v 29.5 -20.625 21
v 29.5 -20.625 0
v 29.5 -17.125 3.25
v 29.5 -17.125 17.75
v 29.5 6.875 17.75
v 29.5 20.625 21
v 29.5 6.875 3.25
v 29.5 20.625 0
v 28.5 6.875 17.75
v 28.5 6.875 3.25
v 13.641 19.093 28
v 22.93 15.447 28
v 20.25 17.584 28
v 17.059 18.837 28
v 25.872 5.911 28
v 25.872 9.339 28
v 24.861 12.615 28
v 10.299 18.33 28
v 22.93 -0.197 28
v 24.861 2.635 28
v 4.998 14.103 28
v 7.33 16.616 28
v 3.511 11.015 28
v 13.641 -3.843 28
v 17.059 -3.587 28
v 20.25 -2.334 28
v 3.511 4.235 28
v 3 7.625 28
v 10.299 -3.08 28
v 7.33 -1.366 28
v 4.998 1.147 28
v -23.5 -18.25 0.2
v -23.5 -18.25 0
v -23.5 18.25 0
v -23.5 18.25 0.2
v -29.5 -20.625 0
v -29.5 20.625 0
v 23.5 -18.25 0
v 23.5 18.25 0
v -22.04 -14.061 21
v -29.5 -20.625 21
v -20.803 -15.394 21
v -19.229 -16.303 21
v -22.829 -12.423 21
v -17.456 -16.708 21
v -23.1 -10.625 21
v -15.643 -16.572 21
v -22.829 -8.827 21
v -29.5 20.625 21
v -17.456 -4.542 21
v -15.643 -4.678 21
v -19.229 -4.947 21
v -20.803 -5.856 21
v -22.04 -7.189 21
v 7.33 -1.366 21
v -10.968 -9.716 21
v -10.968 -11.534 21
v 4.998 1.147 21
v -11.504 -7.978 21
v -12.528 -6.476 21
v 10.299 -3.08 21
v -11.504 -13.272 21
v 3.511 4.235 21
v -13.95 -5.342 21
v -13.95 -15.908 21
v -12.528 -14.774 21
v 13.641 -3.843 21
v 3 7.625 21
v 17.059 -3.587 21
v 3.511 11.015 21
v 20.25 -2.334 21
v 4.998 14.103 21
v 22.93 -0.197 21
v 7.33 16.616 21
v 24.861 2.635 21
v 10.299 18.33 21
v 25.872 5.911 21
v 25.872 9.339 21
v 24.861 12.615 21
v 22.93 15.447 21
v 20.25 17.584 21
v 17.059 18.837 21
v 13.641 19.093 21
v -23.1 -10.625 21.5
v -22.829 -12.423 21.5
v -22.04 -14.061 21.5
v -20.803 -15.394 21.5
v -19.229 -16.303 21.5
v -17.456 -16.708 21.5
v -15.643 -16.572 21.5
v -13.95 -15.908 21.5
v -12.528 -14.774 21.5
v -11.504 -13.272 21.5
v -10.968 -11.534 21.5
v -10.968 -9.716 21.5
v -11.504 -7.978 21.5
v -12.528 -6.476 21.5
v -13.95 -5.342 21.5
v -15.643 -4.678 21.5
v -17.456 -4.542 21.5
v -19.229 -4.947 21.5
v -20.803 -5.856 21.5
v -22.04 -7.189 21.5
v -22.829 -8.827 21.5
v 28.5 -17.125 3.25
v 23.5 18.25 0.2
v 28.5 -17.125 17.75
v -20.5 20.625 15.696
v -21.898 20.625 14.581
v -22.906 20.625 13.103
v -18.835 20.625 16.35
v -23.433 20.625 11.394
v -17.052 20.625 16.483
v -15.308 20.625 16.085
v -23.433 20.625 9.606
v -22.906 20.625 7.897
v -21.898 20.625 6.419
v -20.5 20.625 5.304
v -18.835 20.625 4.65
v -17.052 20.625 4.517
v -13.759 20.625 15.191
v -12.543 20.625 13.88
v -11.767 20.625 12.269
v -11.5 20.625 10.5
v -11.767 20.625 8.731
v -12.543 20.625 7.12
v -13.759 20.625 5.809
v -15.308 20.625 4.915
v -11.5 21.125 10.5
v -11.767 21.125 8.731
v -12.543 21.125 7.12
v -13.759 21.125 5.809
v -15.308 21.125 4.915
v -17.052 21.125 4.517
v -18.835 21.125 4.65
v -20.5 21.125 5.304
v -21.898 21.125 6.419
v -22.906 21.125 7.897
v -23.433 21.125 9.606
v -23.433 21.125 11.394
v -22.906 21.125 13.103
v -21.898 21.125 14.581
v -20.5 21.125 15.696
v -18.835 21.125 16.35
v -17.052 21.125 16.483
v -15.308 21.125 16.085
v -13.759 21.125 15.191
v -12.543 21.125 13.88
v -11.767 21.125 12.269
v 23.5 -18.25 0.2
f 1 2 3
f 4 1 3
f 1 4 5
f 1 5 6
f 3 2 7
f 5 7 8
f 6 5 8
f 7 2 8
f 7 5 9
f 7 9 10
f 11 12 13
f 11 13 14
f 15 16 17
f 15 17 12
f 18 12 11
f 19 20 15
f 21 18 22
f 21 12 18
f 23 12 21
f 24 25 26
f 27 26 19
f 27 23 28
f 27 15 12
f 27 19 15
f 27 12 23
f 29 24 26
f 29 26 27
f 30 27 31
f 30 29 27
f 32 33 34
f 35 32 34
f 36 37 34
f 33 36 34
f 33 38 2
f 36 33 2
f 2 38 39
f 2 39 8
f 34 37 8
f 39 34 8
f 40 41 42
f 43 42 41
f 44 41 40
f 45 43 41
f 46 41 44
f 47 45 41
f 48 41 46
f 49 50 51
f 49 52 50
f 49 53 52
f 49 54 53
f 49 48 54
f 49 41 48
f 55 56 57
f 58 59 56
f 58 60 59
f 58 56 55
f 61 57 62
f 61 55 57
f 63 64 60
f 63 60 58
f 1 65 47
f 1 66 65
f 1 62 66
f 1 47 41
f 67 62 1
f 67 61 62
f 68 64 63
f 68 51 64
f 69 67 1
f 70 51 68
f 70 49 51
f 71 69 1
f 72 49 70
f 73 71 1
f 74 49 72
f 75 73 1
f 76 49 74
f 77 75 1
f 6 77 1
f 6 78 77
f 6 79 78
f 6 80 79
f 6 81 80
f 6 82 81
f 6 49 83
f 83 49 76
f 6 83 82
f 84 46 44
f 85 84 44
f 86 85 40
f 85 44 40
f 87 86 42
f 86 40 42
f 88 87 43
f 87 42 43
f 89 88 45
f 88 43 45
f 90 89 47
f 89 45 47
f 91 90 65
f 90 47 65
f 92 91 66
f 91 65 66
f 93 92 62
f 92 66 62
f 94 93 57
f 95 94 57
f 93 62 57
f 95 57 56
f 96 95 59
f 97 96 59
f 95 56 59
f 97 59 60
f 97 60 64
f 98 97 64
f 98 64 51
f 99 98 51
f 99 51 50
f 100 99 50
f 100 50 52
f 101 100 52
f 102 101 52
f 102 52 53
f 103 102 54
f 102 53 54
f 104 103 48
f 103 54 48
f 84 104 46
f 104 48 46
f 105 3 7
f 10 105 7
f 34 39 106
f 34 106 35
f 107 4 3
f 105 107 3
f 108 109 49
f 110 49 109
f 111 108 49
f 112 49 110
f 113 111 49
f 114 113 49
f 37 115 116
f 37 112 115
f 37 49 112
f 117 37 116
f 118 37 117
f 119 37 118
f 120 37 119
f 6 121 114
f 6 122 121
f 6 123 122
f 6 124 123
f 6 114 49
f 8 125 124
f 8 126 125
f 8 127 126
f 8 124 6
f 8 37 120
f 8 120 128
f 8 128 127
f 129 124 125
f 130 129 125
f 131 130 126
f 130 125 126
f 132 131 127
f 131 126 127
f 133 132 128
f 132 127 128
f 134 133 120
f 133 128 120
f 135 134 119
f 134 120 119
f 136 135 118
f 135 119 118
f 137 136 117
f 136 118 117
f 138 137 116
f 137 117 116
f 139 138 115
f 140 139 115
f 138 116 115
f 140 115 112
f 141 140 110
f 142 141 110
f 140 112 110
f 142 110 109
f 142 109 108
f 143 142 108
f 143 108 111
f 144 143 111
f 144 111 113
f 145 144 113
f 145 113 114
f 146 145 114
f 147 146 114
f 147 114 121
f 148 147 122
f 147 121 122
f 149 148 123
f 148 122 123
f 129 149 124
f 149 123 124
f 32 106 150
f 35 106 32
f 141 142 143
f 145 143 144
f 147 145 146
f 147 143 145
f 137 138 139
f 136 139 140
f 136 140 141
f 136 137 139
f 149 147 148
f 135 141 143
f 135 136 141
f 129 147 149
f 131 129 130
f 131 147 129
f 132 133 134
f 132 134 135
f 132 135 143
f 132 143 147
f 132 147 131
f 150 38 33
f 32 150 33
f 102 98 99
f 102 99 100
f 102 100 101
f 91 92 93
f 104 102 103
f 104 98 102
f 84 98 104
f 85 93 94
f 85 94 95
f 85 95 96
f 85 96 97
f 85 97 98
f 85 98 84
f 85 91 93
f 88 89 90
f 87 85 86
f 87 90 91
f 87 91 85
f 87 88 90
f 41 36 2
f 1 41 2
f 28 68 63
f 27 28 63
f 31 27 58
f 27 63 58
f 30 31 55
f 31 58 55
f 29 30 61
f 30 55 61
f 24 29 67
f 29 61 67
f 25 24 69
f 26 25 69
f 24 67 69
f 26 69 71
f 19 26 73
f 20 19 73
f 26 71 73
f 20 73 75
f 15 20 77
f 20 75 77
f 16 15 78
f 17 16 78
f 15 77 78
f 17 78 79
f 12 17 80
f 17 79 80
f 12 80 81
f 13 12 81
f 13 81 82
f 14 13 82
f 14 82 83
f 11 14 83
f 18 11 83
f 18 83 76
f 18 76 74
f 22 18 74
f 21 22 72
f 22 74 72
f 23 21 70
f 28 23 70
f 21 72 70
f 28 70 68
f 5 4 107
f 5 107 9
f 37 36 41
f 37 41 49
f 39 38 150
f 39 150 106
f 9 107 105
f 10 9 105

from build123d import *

# Parameters (mm, degrees)
SKETCH1_W           = 59
SKETCH1_H           = 41.25
BOSS_EXTRUDE1_DEPTH = 21
SKETCH2_R           = 11.5
BOSS_EXTRUDE2_DEPTH = 7
SKETCH3_R           = 6.1
BOSS_EXTRUDE3_DEPTH = 0.5
SKETCH4_W           = 14.5
SKETCH4_H           = 24
CUT_EXTRUDE1_DEPTH  = 1
SKETCH5_W           = 47
SKETCH5_H           = 36.5
CUT_EXTRUDE2_DEPTH  = 0.2
SKETCH6_R           = 6
BOSS_EXTRUDE4_DEPTH = 0.5


with BuildPart() as part:
    # Sketch1 → Boss-Extrude1 (new body)
    with BuildSketch(Plane.XY):
        Rectangle(SKETCH1_W, SKETCH1_H)
    extrude(amount=BOSS_EXTRUDE1_DEPTH)

    # Sketch2 → Boss-Extrude2 (add)
    with BuildSketch(Plane.XY.offset(21)):
        with Locations(Location((14.5, 7.625, 0), (0, 0, 180))):
            Circle(SKETCH2_R)
    extrude(amount=BOSS_EXTRUDE2_DEPTH)

    # Sketch3 → Boss-Extrude3 (add)
    with BuildSketch(Plane.XY.offset(21)):
        with Locations(Location((-17, -10.625, 0), (0, 0, 180))):
            Circle(SKETCH3_R)
    extrude(amount=BOSS_EXTRUDE3_DEPTH)

    # Sketch4 → Cut-Extrude1 (cut)
    with BuildSketch(Plane(origin=(29.5, 0, 0), x_dir=(0, 0, -1), z_dir=(1, 0, 0))):
        with Locations((-10.5, -5.125)):
            Rectangle(SKETCH4_W, SKETCH4_H)
    extrude(amount=-CUT_EXTRUDE1_DEPTH, mode=Mode.SUBTRACT)

    # Sketch5 → Cut-Extrude2 (cut)
    with BuildSketch(Plane(origin=(0, 0, 0), x_dir=(-1, 0, 0), z_dir=(0, 0, -1))):
        Rectangle(SKETCH5_W, SKETCH5_H)
    extrude(amount=-CUT_EXTRUDE2_DEPTH, mode=Mode.SUBTRACT)

    # Sketch6 → Boss-Extrude4 (add)
    with BuildSketch(Plane(origin=(0, 20.625, 0), x_dir=(1, 0, 0), z_dir=(0, 1, 0))):
        with Locations((-17.5, -10.5)):
            Circle(SKETCH6_R)
    extrude(amount=BOSS_EXTRUDE4_DEPTH)


solid = part.part
